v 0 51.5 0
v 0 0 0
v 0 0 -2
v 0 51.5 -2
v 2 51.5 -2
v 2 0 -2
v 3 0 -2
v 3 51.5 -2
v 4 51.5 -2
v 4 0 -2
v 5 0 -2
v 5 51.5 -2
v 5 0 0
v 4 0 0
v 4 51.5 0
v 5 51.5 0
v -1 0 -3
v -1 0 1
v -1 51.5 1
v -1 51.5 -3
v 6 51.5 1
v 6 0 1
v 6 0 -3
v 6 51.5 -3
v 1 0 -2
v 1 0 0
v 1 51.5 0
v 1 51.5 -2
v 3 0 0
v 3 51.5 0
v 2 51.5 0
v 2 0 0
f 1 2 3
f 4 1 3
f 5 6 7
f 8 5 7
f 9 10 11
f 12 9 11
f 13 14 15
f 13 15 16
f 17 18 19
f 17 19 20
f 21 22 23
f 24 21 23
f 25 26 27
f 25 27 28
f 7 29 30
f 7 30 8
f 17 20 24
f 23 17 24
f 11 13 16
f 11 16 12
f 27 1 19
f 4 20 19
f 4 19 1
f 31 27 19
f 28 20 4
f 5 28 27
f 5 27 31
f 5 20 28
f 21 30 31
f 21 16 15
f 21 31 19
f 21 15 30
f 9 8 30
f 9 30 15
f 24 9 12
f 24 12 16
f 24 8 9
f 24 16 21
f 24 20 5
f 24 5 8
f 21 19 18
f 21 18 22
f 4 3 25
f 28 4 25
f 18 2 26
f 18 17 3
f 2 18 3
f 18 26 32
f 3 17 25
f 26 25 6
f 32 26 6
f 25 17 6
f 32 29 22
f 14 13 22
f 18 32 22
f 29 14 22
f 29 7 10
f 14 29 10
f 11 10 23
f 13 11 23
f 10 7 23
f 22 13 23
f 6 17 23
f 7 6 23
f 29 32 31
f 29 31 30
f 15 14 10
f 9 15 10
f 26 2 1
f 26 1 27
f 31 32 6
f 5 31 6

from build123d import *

# Parameters (mm, degrees)
SKETCH1_W           = 7
SKETCH1_H           = 4
SKETCH1_W_2         = 1
SKETCH1_H_2         = 2
BOSS_EXTRUDE1_DEPTH = 51.5


with BuildPart() as part:
    # Sketch1 → Boss-Extrude1 (new body)
    with BuildSketch(Plane(origin=(0, 0, 0), x_dir=(1, 0, 0), z_dir=(0, 1, 0))):
        with Locations((2.5, 1)):
            Rectangle(SKETCH1_W, SKETCH1_H)
        with Locations((0.5, 1)):
            Rectangle(SKETCH1_W_2, SKETCH1_H_2, mode=Mode.SUBTRACT)
        with Locations((2.5, 1)):
            Rectangle(SKETCH1_W_2, SKETCH1_H_2, mode=Mode.SUBTRACT)
        with Locations((4.5, 1)):
            Rectangle(SKETCH1_W_2, SKETCH1_H_2, mode=Mode.SUBTRACT)
    extrude(amount=BOSS_EXTRUDE1_DEPTH)


solid = part.part
